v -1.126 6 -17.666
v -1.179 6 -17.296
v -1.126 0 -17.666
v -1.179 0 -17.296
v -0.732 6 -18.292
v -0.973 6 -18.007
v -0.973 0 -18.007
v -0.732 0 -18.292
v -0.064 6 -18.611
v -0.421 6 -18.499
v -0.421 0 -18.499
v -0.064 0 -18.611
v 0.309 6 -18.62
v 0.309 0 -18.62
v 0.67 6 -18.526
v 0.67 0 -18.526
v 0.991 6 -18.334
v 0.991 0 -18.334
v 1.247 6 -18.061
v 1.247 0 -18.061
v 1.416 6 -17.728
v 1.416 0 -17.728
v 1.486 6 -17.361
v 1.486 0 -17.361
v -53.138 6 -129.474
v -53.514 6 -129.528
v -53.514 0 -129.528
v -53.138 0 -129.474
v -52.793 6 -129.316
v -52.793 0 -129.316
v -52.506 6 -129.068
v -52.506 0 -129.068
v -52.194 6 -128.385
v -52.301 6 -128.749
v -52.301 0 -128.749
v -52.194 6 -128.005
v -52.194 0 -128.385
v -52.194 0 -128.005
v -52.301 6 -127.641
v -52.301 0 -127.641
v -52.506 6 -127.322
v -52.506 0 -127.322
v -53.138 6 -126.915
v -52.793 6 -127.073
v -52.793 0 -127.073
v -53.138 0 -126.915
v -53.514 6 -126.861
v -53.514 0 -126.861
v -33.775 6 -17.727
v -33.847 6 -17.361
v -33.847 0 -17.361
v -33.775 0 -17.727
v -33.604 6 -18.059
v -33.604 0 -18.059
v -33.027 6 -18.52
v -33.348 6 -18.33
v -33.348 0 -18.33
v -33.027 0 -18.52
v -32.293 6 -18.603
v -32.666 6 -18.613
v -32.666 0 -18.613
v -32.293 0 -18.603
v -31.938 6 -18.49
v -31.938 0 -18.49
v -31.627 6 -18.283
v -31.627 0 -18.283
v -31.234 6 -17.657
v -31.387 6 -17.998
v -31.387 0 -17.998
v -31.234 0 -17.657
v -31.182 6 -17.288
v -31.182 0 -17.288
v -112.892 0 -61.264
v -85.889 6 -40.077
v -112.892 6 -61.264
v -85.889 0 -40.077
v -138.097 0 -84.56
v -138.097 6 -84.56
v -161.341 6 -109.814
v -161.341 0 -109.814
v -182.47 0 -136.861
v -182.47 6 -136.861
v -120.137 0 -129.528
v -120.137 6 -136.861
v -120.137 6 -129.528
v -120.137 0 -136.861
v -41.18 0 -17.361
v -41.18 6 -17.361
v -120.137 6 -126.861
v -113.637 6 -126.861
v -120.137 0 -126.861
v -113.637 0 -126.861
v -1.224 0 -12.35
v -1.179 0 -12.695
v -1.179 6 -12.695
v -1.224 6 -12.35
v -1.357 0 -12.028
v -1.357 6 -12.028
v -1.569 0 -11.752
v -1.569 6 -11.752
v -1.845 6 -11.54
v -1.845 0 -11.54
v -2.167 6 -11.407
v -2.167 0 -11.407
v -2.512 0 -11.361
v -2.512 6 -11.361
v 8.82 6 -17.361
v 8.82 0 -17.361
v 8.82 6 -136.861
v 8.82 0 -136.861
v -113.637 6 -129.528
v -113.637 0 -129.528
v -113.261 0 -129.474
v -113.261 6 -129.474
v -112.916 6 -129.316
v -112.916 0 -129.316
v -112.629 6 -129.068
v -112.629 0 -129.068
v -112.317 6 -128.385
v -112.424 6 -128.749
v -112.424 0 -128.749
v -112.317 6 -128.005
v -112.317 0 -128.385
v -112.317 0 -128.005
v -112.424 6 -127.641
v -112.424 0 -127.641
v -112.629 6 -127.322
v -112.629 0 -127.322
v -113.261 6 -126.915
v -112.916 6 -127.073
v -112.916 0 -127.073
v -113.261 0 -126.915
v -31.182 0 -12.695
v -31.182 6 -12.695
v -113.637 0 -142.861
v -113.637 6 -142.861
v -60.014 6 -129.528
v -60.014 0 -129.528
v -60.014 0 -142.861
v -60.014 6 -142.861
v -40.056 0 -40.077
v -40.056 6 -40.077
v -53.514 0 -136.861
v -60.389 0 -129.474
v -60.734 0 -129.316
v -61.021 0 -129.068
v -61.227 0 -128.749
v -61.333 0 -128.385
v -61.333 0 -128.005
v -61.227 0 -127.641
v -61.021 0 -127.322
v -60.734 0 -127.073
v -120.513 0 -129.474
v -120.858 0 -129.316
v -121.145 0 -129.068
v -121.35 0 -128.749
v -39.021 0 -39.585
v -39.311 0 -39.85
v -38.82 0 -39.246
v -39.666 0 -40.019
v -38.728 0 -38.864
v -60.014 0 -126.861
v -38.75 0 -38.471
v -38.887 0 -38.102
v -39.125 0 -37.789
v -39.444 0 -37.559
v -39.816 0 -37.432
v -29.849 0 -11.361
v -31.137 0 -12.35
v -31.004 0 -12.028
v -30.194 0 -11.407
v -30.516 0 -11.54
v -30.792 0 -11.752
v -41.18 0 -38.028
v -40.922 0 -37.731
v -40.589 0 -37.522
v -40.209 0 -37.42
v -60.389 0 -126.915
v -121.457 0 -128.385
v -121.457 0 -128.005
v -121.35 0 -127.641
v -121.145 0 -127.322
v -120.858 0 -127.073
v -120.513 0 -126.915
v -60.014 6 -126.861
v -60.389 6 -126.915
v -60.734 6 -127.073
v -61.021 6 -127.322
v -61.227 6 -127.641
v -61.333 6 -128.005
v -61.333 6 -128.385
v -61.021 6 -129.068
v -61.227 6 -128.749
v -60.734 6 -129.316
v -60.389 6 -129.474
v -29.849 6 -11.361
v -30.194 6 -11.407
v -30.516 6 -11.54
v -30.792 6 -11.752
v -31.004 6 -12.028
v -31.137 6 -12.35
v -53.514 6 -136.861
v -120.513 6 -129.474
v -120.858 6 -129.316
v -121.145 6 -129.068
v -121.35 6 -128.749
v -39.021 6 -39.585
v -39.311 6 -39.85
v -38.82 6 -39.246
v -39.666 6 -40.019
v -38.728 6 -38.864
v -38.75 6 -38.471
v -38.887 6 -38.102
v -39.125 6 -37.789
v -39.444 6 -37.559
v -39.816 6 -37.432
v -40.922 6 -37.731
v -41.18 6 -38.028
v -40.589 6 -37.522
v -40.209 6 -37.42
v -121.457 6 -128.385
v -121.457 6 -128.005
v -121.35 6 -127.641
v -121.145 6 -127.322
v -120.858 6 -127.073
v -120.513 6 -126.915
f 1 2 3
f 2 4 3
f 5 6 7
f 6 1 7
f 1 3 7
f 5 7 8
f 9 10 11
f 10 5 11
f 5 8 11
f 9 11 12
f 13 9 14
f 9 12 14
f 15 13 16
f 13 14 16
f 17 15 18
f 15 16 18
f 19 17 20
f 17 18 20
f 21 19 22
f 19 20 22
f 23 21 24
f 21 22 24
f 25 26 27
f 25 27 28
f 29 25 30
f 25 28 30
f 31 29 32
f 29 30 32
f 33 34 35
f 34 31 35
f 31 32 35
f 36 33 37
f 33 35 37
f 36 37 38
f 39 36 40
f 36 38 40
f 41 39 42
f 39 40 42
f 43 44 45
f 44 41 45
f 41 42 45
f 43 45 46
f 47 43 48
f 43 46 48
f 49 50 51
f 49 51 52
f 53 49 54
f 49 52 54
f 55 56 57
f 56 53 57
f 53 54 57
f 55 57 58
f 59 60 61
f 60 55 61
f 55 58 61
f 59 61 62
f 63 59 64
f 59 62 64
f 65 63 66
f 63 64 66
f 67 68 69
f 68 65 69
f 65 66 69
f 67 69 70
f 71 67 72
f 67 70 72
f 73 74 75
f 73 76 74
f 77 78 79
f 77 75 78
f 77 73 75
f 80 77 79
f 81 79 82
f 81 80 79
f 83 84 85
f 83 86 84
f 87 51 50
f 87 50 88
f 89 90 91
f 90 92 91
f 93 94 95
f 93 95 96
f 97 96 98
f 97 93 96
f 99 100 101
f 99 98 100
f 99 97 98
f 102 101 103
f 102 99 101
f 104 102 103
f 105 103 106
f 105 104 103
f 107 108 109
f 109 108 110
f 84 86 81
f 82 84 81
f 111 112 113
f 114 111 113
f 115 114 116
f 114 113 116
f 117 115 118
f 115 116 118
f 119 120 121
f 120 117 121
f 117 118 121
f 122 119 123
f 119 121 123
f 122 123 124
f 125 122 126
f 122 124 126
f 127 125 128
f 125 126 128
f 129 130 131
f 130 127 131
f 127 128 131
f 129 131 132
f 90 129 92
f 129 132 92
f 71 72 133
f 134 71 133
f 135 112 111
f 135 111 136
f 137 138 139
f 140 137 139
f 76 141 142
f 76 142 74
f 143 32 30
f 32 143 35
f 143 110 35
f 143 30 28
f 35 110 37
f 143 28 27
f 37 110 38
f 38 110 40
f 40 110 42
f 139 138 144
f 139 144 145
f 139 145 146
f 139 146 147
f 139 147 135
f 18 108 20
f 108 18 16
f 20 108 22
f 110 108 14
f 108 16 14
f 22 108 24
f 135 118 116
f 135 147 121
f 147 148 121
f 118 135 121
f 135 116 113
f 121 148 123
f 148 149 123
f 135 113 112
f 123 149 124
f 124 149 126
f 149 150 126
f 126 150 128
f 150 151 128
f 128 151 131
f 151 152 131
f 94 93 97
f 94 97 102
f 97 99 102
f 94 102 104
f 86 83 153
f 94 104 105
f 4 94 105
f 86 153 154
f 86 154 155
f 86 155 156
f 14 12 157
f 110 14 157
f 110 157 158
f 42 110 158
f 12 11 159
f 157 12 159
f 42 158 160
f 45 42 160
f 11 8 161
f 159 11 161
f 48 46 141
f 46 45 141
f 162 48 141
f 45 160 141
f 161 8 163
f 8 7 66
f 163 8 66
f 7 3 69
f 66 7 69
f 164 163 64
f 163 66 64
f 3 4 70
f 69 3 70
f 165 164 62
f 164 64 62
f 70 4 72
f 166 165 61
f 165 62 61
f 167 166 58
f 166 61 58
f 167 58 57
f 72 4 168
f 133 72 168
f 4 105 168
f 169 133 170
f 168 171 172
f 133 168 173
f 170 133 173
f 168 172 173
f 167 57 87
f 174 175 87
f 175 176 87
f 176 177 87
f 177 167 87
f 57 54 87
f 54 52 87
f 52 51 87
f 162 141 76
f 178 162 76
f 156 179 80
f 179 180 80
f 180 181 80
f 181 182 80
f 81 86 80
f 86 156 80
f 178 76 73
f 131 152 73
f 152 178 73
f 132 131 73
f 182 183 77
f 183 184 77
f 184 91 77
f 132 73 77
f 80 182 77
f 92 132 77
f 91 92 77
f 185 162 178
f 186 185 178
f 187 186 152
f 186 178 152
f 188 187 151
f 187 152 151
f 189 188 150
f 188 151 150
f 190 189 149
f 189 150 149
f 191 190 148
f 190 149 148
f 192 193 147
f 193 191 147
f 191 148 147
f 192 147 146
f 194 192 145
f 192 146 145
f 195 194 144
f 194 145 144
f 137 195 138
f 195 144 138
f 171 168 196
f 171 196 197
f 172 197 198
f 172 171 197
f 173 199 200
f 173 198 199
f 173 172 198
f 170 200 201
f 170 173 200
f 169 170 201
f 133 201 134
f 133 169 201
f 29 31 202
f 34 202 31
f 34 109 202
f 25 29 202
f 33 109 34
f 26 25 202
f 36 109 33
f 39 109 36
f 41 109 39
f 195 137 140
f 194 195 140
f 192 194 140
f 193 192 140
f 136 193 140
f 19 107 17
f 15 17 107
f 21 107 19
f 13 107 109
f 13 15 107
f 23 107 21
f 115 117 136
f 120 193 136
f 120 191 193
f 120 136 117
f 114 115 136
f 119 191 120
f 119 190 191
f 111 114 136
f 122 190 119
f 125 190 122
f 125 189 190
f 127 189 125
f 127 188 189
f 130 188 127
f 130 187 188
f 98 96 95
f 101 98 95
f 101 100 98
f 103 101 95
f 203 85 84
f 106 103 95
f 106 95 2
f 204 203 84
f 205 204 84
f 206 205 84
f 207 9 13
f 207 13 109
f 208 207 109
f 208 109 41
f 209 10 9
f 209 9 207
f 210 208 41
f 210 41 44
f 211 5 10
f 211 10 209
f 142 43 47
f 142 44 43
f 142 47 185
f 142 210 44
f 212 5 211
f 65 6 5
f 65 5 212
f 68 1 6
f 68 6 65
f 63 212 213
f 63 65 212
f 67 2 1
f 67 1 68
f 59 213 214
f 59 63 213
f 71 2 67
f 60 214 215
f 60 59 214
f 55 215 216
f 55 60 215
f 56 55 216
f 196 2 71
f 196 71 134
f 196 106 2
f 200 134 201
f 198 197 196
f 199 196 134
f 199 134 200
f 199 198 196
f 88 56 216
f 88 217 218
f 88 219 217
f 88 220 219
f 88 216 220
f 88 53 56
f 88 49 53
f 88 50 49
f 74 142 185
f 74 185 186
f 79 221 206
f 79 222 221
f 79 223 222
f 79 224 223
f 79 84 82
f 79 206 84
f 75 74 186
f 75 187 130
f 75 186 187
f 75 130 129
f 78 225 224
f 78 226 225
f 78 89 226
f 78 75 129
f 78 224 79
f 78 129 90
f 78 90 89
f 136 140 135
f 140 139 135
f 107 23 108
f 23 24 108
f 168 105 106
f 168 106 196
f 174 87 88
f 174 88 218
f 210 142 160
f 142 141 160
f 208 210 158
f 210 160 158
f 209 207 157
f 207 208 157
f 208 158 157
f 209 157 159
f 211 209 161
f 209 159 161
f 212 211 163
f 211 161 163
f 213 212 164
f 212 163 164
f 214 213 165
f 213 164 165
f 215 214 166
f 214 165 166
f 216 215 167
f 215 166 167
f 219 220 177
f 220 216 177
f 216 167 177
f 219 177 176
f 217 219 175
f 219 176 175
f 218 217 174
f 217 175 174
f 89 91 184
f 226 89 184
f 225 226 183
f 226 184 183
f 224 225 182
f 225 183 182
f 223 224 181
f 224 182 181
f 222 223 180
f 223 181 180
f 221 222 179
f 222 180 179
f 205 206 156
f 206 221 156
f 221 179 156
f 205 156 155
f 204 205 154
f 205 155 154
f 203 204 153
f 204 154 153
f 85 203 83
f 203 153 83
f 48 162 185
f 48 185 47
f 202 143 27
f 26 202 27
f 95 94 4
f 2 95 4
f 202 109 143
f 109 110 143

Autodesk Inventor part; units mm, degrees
ref_plane "YZ Plane" through (0, 0, 0) normal (1, 0, 0) x (0, 1, 0)
ref_plane "XZ Plane" through (0, 0, 0) normal (0, 1, 0) x (-1, 0, 0)
ref_plane "XY Plane" through (0, 0, 0) normal (0, 0, 1) x (1, 0, 0)
sketch "Sketch1" plane through (0, 0, 0) normal (0, 1, 0) x (-1, 0, 0)
  arc A0 (-1.4864, -17.3614) -> (1.1787, -17.296) centre (-0.1546, -17.296) ccw
  arc A1 (31.1823, -17.2881) -> (33.847, -17.3614) centre (32.5157, -17.2881) ccw
  line L0 (33.847, -17.3614) -> (41.1803, -17.3614)
  line L1 (-1.4864, -17.3614) -> (-8.8197, -17.3614)
  line L2 (-8.8197, -17.3614) -> (-8.8197, -136.8614)
  line L3 (41.1803, -17.3614) -> (41.1803, -38.0281)
  arc A2 (41.1803, -38.0281) -> (40.0555, -40.0773) centre (40.0555, -38.7439) ccw
  line L4 (40.0555, -40.0773) -> (85.8888, -40.0773)
  line L5 (-8.8197, -136.8614) -> (53.5136, -136.8614)
  line L6 (53.5136, -136.8614) -> (53.5136, -129.5281)
  arc A3 (53.5136, -126.8614) -> (53.5136, -129.5281) centre (53.5136, -128.1947) ccw
  arc A4 (60.0136, -129.5281) -> (60.0136, -126.8614) centre (60.0136, -128.1947) ccw
  line L7 (60.0136, -129.5281) -> (60.0136, -142.8614)
  line L8 (60.0136, -126.8614) -> (53.5136, -126.8614)
  line L9 (120.137, -136.8614) -> (120.137, -129.5281)
  arc A5 (120.137, -129.5281) -> (120.137, -126.8614) centre (120.137, -128.1947) ccw
  arc A6 (113.637, -126.8614) -> (113.637, -129.5281) centre (113.637, -128.1947) ccw
  line L10 (113.637, -129.5281) -> (113.637, -142.8614)
  line L11 (113.637, -126.8614) -> (120.137, -126.8614)
  arc A7 (182.4703, -136.8614) -> (85.8888, -40.0773) centre (-162.7379, -384.7652) ccw
  line L12 (120.137, -136.8614) -> (182.4703, -136.8614)
  arc A8 (2.512, -11.3614) -> (1.1787, -12.6947) centre (2.512, -12.6947) ccw
  line L13 (1.1787, -12.6947) -> (1.1787, -17.296)
  arc A9 (31.1823, -12.6947) -> (29.849, -11.3614) centre (29.849, -12.6947) ccw
  line L14 (2.512, -11.3614) -> (29.849, -11.3614)
  line L15 (31.1823, -17.2881) -> (31.1823, -12.6947)
  line L16 (60.0136, -142.8614) -> (113.637, -142.8614)
  point P0 (0, 0)
  point P1 (28.8512, 3.0303)
  point P2 (-1.1488, 3.0309)
  dimension "d1" = 2.6667
  dimension "d2" = 30
  dimension "d4" = 2.6667
  dimension "d6" = 7.3333
  dimension "d7" = 7.3333
  dimension "d8" = 20.6667
  dimension "d9" = 2.6667
  dimension "d10" = 45.8333
  dimension "d11" = 119.5
  dimension "d12" = 62.3333
  dimension "d19" = 7.3333
  dimension "d53" = 2.6667
  dimension "d56" = 2.6667
  dimension "d58" = 6.5
  dimension "d59" = 13.3333
  dimension "d61" = 425
  dimension "d64" = 13.3333
  dimension "d67" = 7.3333
  dimension "d73" = 50
  dimension "d74" = 2.6667
  dimension "d75" = 6
  dimension "d76" = 191.29
  dimension "d77" = 6.5
  dimension "d78" = 6.5
  dimension "d79" = 6.5
  dimension "d80" = 1.3333
  dimension "d81" = 1.3333
  dimension "d82" = 90
  dimension "d83" = 2.6667
  dimension "d84" = 2.6667
  dimension "d85" = 2.6667
  dimension "d86" = 2.6667
  dimension "d87" = 53.6233
extrude "Extrusion1" add sketch "Sketch1" along normal blind 6
properties part number "Support A1" material "Wood (Maple)"
